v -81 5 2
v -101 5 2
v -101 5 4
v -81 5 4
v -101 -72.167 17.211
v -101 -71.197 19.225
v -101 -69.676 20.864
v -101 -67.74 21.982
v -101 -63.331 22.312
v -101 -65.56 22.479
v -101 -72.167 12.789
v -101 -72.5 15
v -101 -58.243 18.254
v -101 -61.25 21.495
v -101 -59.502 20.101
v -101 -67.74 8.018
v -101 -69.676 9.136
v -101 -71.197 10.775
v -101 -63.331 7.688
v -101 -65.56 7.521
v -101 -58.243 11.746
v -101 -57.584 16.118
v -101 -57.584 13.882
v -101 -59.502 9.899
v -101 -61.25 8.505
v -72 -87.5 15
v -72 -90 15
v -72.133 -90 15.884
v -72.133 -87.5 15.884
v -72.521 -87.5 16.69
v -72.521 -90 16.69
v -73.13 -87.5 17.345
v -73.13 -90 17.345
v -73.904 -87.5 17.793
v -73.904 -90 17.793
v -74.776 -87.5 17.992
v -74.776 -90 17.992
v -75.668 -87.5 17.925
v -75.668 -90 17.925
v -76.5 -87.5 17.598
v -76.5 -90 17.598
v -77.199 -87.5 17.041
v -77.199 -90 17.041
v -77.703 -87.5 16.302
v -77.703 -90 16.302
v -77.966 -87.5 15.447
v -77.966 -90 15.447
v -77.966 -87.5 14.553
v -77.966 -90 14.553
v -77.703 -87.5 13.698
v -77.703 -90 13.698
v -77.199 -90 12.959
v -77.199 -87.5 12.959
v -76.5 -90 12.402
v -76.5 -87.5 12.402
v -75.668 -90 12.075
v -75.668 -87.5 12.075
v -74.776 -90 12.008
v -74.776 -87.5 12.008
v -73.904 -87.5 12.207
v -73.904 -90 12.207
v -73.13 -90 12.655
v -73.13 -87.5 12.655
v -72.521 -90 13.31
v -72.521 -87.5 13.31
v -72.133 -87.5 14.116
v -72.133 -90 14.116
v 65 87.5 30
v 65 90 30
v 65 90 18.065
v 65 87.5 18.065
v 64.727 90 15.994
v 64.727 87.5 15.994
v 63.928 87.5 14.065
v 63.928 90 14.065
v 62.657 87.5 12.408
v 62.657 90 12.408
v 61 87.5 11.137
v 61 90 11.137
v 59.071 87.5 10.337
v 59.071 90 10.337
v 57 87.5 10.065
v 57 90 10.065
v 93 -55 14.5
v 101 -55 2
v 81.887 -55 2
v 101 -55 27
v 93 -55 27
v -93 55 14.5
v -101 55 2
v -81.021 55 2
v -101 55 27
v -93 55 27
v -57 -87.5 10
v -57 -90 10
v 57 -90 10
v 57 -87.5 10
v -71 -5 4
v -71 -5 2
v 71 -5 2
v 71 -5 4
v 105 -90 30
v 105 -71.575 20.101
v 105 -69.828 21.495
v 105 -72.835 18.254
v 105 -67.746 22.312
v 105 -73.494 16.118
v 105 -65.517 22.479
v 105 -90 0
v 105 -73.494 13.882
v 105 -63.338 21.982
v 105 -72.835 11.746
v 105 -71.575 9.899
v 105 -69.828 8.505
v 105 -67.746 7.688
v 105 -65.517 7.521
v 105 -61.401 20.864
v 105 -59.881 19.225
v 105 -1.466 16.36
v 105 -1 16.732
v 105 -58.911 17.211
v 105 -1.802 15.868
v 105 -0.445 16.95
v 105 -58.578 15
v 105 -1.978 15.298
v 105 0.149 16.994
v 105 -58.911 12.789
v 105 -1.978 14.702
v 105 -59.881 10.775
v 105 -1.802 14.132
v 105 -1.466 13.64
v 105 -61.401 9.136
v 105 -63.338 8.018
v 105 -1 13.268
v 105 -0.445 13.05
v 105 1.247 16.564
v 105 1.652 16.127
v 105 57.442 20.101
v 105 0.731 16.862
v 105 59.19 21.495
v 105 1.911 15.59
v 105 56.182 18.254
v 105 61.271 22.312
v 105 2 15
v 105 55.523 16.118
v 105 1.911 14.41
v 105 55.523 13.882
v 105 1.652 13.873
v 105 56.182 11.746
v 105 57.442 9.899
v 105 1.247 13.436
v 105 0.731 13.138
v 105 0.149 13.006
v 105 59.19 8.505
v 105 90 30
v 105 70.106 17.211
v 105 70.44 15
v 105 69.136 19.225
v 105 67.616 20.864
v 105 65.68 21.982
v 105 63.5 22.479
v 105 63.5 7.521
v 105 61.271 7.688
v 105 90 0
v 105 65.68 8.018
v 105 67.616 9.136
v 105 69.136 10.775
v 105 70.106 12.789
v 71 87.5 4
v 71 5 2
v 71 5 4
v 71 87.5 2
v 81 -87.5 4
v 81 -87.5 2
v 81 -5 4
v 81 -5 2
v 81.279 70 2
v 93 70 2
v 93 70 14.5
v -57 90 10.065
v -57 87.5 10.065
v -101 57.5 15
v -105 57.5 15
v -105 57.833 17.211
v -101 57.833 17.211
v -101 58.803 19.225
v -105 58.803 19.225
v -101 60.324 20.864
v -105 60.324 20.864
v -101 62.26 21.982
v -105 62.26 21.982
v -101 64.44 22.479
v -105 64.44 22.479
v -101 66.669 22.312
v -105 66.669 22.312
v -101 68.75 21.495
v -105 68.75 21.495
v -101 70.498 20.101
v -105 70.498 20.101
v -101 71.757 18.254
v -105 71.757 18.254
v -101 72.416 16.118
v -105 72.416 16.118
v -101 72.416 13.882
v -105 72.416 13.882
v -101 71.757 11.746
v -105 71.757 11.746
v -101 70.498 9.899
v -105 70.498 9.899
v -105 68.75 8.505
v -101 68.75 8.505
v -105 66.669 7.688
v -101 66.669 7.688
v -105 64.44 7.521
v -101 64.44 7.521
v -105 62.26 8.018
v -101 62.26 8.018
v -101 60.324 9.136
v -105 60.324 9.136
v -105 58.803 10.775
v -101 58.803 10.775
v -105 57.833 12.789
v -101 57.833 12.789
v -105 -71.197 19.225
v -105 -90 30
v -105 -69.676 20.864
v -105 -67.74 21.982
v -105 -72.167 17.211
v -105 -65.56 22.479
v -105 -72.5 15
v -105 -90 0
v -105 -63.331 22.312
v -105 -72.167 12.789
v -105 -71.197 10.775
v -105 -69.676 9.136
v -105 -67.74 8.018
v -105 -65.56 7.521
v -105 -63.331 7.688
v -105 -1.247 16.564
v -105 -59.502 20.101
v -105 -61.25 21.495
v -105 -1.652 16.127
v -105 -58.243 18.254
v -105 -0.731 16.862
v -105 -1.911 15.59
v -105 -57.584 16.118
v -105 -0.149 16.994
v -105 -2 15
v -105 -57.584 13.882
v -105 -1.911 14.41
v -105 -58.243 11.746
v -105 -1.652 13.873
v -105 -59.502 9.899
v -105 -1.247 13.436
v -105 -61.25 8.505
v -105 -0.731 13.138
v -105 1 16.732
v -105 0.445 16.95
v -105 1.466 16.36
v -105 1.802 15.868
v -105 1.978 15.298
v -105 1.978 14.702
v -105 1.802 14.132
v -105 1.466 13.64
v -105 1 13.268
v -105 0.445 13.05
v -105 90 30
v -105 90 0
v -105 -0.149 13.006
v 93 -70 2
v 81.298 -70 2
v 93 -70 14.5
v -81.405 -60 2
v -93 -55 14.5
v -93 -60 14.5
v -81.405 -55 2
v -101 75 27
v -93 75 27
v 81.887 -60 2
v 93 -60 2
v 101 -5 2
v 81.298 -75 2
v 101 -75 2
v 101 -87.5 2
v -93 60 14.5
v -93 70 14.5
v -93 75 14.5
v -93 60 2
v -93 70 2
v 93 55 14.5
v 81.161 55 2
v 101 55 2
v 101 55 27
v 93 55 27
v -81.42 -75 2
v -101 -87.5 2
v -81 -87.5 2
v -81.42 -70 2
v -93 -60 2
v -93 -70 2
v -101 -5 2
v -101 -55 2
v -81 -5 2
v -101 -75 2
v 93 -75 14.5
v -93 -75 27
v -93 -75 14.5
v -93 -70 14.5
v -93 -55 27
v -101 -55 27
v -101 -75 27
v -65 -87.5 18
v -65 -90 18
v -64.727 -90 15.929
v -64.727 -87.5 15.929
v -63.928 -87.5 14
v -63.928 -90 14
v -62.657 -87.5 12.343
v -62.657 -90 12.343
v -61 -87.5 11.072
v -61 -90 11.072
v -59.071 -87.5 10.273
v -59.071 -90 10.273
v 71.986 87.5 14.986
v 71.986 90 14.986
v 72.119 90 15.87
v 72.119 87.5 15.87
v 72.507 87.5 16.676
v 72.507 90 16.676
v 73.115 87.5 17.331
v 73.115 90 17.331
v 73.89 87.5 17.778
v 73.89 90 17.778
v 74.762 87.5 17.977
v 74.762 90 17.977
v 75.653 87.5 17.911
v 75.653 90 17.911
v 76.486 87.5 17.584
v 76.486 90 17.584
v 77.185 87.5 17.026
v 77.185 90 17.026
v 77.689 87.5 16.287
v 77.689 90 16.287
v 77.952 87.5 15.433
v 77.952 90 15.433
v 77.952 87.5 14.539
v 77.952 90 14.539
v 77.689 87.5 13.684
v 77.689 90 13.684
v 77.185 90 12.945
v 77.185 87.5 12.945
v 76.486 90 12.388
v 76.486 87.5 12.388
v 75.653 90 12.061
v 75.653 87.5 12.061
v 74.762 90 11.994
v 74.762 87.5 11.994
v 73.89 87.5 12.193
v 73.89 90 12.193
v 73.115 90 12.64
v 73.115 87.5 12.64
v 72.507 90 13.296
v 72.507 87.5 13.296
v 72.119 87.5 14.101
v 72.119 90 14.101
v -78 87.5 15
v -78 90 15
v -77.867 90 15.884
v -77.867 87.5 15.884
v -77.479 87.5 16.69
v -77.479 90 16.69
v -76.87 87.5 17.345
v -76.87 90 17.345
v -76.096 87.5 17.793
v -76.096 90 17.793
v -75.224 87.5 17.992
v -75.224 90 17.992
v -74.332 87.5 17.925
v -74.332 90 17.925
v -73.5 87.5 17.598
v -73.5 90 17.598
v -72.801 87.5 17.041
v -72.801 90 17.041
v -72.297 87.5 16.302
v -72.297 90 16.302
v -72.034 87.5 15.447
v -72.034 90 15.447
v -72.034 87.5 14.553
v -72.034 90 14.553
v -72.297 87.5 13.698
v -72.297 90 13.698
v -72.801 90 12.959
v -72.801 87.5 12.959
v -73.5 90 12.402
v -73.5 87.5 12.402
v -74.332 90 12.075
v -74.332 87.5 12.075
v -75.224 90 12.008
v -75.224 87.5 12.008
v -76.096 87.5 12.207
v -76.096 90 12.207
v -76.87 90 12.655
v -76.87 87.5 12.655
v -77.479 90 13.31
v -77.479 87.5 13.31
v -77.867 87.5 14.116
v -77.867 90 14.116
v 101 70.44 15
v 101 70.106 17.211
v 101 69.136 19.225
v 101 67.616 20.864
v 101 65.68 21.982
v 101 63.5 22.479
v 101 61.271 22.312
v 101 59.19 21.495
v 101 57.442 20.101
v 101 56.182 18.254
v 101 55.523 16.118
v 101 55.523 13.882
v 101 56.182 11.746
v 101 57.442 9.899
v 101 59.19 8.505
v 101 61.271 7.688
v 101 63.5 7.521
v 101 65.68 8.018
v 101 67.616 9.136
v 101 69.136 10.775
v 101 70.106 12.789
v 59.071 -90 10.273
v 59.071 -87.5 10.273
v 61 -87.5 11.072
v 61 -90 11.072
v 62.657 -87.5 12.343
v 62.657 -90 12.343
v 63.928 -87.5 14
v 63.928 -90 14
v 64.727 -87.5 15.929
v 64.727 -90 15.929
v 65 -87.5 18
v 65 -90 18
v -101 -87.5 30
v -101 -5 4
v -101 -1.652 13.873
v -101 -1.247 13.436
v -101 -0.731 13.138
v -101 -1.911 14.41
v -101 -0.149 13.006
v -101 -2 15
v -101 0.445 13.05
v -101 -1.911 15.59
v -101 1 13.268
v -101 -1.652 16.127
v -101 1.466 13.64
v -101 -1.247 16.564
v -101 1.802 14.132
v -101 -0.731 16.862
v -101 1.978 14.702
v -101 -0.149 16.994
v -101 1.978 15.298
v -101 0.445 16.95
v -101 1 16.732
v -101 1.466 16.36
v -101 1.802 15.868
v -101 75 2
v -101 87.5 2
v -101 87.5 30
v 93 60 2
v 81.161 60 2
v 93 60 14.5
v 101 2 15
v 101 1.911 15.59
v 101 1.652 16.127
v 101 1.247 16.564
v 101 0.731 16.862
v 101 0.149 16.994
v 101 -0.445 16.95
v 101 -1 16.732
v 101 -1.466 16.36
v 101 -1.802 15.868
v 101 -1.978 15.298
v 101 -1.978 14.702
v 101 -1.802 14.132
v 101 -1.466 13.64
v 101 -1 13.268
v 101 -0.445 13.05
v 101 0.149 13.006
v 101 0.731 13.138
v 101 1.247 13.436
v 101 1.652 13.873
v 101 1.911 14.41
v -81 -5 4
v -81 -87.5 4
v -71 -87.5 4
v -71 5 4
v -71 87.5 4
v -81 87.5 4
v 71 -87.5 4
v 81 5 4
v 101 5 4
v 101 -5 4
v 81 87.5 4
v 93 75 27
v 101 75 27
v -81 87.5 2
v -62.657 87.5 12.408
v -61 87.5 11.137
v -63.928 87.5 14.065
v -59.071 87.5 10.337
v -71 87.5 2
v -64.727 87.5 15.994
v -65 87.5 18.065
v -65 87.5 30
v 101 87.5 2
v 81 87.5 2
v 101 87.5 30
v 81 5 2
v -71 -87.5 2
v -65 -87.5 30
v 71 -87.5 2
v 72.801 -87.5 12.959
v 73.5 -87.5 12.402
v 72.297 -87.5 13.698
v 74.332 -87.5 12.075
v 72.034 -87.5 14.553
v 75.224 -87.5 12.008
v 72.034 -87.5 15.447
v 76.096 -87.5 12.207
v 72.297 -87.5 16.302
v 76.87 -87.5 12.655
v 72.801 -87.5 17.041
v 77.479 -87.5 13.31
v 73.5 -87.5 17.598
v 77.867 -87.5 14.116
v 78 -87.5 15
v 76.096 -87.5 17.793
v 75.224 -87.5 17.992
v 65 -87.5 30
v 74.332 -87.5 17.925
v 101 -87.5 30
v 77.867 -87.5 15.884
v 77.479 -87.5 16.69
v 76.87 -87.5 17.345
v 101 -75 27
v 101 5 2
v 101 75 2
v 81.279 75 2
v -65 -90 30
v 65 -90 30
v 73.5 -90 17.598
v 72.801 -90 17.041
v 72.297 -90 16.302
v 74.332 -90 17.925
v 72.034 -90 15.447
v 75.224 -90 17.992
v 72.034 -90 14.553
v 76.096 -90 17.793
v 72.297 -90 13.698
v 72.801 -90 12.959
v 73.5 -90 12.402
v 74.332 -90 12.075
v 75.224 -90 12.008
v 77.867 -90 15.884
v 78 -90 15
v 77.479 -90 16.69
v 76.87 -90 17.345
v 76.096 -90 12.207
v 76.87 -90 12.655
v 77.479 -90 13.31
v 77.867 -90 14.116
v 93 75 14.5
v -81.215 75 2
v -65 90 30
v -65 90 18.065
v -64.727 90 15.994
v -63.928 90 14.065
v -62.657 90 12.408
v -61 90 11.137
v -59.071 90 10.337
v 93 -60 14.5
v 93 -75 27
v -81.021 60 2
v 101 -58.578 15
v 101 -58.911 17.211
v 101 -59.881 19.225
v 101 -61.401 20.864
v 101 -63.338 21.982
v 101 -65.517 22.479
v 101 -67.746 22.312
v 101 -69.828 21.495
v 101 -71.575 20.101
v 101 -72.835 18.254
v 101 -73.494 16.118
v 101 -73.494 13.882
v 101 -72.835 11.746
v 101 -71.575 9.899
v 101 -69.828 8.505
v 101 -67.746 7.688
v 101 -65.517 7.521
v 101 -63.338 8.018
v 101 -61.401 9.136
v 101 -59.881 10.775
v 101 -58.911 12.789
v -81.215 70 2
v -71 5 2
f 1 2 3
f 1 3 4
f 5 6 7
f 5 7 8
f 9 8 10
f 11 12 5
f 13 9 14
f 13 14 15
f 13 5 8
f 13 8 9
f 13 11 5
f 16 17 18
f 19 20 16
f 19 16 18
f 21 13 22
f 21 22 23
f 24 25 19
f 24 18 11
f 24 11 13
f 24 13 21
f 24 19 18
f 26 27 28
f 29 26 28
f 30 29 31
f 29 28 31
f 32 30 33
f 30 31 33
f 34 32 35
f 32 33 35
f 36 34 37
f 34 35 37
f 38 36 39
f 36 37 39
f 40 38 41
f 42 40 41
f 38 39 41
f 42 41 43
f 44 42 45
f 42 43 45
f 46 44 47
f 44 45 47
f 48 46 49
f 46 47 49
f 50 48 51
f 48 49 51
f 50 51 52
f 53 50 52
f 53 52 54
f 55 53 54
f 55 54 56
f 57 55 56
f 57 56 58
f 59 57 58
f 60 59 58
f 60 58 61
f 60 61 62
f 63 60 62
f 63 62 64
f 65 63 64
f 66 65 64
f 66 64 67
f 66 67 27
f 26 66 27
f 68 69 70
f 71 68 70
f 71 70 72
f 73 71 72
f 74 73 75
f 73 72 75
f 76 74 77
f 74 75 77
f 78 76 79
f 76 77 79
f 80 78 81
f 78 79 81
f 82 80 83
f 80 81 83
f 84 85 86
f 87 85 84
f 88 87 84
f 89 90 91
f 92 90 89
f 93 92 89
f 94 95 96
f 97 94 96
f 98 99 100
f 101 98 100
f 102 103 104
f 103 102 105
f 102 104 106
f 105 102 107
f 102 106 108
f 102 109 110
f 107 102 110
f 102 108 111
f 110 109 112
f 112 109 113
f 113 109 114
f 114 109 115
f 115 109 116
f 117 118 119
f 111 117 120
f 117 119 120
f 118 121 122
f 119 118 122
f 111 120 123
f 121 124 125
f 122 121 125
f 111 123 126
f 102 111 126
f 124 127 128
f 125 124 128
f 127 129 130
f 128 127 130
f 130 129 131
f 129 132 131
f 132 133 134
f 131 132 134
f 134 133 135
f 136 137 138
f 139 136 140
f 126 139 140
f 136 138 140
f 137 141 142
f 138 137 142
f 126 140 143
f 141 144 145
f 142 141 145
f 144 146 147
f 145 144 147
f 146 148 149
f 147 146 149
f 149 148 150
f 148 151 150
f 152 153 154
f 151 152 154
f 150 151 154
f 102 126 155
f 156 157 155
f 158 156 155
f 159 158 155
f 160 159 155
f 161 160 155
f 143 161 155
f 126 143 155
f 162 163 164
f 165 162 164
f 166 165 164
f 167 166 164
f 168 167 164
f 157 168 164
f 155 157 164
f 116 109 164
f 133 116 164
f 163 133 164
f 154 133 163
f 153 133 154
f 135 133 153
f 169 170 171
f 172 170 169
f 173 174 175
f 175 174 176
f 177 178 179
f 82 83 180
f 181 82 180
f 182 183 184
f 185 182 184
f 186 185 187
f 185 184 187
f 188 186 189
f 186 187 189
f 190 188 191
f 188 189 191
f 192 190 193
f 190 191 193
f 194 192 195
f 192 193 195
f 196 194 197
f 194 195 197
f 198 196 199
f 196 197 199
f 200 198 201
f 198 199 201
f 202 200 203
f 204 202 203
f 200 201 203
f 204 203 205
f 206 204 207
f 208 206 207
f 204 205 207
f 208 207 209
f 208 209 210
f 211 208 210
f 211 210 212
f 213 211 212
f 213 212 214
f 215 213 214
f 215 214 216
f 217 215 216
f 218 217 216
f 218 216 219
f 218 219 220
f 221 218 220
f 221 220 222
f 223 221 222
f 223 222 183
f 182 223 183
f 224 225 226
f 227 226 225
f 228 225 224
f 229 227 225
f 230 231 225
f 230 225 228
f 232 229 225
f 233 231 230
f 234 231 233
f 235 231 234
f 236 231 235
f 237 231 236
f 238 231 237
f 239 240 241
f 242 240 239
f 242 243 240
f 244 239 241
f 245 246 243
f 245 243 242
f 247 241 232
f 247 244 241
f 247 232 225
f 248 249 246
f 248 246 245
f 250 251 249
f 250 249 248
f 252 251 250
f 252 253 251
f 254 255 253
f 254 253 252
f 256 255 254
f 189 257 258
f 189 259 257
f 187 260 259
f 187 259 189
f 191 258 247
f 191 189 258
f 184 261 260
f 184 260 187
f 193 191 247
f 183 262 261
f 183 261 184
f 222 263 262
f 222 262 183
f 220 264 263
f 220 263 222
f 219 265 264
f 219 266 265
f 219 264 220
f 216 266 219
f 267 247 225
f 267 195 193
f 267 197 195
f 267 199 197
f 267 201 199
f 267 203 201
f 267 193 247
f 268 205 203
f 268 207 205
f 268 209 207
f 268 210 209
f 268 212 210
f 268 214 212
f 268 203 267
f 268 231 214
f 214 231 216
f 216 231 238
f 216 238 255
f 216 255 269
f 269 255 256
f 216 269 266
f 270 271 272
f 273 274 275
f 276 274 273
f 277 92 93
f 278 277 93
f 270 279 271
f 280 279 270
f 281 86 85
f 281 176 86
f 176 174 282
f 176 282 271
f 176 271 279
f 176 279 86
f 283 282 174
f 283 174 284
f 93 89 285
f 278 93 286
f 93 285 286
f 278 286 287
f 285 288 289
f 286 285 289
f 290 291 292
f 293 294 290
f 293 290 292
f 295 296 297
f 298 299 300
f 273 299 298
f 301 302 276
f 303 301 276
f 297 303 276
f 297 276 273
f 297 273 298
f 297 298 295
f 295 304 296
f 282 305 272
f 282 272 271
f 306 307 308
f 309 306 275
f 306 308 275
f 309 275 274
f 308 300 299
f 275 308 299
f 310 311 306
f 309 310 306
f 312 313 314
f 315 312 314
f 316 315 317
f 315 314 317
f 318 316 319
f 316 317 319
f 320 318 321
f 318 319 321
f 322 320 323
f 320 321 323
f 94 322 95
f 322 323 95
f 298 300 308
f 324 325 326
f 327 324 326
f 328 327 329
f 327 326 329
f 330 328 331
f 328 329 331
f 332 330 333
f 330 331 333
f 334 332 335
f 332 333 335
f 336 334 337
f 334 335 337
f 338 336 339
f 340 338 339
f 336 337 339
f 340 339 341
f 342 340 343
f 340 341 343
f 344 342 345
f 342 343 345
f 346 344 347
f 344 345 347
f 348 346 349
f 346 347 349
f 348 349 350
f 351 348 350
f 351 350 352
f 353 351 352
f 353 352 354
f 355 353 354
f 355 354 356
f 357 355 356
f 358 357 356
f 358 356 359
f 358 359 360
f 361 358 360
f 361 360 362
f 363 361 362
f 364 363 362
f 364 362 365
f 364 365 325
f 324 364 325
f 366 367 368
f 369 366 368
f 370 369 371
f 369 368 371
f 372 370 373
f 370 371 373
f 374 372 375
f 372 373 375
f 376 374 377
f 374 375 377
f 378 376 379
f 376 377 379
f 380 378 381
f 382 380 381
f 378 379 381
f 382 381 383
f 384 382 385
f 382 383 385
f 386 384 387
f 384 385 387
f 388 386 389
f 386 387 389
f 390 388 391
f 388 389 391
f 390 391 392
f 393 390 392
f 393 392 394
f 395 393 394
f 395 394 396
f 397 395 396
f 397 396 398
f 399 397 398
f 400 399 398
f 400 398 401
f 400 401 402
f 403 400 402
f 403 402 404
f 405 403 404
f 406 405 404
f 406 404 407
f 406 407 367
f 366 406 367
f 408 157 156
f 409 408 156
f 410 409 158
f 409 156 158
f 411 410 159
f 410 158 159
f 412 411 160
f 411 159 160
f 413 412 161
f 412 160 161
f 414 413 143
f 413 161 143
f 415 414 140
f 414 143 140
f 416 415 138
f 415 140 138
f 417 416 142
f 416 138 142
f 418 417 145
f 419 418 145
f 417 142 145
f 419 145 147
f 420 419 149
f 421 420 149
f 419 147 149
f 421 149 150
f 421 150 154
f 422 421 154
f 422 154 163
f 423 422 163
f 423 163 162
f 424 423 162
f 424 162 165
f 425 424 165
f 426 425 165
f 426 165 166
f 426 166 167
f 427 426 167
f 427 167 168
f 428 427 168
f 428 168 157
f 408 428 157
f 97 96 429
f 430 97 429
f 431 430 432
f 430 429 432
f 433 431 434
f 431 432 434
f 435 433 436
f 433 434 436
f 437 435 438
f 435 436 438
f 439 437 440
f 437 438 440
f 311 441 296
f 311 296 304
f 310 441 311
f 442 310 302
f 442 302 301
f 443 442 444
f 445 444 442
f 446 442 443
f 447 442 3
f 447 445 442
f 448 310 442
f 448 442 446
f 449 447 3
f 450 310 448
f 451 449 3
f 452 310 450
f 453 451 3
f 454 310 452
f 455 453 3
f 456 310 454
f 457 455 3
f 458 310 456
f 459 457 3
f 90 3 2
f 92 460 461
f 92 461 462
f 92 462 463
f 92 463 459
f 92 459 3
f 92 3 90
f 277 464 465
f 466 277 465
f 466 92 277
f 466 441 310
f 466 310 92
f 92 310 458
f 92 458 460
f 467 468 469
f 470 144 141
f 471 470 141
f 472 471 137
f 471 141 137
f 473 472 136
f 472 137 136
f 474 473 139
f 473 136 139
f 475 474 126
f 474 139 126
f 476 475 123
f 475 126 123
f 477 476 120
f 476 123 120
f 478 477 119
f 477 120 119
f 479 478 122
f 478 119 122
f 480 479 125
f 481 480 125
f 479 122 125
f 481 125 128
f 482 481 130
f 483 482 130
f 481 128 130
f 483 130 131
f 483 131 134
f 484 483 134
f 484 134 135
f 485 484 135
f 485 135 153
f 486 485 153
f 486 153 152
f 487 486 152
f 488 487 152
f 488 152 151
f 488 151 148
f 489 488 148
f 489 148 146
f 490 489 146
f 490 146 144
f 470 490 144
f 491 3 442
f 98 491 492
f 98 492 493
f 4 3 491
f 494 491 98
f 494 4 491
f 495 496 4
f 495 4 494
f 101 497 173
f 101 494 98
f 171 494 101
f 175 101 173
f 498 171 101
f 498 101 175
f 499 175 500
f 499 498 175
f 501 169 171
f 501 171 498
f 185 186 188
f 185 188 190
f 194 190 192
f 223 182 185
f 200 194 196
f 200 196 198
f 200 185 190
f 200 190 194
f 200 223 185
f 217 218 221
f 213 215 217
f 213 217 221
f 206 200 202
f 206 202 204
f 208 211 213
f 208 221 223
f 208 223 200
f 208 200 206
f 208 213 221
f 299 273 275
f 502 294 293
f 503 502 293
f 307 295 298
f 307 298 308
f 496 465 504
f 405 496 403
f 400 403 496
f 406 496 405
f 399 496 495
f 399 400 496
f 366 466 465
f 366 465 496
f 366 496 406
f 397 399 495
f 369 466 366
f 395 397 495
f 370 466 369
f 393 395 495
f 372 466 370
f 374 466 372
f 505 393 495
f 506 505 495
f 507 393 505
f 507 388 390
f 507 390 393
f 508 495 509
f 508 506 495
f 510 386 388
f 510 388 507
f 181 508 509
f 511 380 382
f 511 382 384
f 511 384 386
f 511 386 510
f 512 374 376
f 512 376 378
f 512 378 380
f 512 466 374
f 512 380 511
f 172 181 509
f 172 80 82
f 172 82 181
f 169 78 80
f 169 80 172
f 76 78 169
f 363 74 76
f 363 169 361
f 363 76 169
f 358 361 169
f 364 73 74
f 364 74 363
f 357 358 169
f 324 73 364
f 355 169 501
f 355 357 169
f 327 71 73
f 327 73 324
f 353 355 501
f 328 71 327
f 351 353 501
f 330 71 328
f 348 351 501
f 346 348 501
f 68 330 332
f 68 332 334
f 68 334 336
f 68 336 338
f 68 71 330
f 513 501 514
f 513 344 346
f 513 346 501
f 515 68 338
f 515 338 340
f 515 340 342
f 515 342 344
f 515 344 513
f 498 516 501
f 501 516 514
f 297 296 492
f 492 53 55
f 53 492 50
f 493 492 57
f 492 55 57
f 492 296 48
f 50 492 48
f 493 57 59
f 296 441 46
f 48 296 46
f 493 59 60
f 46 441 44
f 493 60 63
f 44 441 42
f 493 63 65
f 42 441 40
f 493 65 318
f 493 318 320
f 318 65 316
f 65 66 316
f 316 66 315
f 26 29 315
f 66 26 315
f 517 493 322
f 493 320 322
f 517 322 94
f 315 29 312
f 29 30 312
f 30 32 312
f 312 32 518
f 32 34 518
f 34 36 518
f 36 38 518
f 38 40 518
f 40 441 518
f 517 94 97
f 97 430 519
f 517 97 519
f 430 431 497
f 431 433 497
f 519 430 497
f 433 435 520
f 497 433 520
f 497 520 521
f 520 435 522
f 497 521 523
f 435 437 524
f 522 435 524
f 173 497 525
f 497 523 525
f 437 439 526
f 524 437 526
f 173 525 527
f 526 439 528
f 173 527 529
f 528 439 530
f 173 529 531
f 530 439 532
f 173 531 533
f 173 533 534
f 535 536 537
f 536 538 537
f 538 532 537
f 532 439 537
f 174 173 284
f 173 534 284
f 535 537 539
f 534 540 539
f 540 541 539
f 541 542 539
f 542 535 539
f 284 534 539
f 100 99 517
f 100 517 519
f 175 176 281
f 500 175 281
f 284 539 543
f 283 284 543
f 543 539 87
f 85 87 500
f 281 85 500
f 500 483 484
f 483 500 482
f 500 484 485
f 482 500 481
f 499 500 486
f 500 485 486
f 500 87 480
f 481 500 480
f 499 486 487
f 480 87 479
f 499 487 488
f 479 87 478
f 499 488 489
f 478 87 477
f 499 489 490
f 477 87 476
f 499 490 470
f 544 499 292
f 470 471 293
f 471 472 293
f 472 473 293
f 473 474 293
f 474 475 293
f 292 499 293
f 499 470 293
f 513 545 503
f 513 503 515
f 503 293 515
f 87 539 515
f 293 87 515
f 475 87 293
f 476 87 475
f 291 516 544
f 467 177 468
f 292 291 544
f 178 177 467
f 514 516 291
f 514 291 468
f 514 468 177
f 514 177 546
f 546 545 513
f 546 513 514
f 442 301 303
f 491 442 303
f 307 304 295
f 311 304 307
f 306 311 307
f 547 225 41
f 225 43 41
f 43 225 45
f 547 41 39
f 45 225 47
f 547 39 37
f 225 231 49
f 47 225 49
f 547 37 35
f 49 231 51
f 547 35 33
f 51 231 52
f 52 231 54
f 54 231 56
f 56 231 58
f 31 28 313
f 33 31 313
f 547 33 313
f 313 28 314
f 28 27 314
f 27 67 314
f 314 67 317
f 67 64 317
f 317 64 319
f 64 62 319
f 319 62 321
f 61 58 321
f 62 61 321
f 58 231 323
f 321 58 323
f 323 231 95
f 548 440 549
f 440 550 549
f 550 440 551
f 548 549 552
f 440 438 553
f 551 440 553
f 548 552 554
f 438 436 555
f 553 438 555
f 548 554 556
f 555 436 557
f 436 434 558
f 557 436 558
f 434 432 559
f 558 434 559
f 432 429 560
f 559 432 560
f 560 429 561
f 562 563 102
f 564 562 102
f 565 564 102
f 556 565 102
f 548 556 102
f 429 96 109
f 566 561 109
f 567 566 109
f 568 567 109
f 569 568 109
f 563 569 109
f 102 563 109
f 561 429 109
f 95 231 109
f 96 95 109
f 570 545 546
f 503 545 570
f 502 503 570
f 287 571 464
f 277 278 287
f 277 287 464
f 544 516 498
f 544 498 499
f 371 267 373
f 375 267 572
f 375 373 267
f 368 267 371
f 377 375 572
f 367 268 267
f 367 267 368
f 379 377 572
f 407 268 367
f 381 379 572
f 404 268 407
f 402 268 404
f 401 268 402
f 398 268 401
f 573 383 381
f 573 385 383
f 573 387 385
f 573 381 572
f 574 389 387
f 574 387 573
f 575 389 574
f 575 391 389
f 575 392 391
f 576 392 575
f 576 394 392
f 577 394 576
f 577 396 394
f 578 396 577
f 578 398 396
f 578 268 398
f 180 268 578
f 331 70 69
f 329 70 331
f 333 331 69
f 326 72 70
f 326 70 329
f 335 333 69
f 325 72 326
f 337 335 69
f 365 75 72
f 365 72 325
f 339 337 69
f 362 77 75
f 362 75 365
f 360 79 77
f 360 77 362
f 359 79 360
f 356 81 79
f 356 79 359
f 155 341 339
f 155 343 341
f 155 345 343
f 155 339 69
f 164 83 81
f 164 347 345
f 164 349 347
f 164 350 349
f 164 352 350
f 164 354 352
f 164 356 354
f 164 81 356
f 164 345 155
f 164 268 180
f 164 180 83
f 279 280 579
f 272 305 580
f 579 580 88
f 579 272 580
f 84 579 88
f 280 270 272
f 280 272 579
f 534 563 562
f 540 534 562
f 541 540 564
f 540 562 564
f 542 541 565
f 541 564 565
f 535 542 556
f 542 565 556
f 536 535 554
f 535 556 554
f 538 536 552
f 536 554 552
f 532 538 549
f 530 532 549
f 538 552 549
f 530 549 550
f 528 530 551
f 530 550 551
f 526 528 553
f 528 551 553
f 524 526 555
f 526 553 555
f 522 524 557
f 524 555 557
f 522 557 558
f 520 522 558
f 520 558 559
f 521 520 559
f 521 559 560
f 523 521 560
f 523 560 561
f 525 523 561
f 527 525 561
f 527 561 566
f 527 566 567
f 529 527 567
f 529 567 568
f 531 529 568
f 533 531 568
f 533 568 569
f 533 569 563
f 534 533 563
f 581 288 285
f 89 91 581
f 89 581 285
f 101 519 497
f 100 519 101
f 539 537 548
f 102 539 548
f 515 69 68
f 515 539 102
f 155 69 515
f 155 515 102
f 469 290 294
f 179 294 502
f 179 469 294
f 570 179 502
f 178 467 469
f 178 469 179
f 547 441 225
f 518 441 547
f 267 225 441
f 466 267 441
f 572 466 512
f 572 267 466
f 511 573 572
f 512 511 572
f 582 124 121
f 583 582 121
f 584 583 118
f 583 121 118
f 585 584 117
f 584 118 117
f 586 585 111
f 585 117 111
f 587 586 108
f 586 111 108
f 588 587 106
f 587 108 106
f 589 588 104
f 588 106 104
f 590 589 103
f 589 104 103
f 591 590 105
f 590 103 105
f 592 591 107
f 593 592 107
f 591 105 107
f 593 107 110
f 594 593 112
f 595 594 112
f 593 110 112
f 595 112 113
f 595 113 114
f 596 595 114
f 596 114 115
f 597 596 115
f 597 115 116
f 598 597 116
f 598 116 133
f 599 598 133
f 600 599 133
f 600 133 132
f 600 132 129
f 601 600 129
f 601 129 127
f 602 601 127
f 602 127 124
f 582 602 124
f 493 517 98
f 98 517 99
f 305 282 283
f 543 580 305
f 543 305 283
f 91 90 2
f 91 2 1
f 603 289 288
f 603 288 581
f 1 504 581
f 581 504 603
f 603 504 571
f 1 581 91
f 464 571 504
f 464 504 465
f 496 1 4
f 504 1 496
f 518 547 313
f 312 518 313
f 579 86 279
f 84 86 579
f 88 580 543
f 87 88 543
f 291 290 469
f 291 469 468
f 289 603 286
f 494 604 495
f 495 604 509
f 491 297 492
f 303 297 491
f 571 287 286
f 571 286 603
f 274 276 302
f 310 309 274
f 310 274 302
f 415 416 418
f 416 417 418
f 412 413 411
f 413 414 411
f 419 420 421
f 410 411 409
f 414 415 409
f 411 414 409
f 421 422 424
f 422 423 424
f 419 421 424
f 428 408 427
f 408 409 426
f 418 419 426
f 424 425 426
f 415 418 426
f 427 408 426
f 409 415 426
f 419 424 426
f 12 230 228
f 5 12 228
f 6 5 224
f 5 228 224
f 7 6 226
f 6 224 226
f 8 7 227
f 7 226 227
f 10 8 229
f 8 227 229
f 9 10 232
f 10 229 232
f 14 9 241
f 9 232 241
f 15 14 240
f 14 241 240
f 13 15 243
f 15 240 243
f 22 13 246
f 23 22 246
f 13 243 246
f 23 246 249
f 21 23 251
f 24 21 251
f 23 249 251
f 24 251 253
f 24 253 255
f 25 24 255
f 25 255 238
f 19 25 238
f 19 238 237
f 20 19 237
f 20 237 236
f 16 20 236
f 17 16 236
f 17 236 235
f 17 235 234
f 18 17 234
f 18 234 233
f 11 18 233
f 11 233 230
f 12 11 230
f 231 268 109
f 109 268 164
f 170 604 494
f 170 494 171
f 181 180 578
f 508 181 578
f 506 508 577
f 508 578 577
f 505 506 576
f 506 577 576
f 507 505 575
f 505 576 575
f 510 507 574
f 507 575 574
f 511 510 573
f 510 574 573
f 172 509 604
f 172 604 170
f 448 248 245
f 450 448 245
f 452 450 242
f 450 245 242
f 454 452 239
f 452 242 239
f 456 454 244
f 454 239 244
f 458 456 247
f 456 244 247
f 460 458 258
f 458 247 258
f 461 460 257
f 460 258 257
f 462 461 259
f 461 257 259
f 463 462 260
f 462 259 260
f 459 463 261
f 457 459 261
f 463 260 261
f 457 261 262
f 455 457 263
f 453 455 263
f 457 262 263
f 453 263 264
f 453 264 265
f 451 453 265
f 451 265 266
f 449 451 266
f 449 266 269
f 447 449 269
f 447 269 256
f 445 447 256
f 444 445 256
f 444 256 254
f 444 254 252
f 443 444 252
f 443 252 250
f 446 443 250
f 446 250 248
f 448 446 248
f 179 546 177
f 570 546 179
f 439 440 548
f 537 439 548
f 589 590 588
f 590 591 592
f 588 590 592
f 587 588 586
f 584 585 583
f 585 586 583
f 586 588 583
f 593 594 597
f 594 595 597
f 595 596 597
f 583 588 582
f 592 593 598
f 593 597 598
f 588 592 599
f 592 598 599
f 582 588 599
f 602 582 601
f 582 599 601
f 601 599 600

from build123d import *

# Parameters (mm, degrees)
F0_W      = 210
F0_H      = 180
F1_DEPTH  = 30
F2_W      = 202
F2_H      = 175
F3_DEPTH  = 28
F4_R      = 3
F5_DEPTH  = 4
F6_W      = 10
F6_H      = 82.5
F6_W_2    = 20
F6_H_2    = 10
F6_W_3    = 142
F7_DEPTH  = 2
F8_R      = 2
F9_DEPTH  = 5
F10_R     = 2
F10_R_2   = 7.5
F11_DEPTH = 5
F12_R     = 7.5
F13_DEPTH = 5
F14_W     = 8
F14_H     = 20
F15_DEPTH = 25
F17_DEPTH = 5
F19_DEPTH = 5
F21_DEPTH = 5
F23_DEPTH = 5
F25_DEPTH = 5
F27_DEPTH = 5
F30_DEPTH = 5
F32_DEPTH = 5
F33_R     = 3
F34_DEPTH = 4


# Not quite as in the source:
# - a feature names something its author has since deleted; it is built from what else it names


with BuildPart() as f1:
    # F0 (on Top) → F1 (new body)
    with BuildSketch(Plane.XY):
        Rectangle(F0_W, F0_H)
    extrude(amount=F1_DEPTH)

    # F2 (on face) → F3 (cut)
    with BuildSketch(Plane.XY.offset(30)):
        Rectangle(F2_W, F2_H)
    extrude(amount=-F3_DEPTH, mode=Mode.SUBTRACT)

    # F4 (on face) → F5 (cut)
    with BuildSketch(Plane.XZ.offset(90)):
        with BuildLine():
            Line((-57, 10), (-15, 10))
            Line((-15, 10), (15, 10))
            Line((15, 10), (57, 10))
            ThreePointArc((57, 10), (62.6568542495, 12.3431457505), (65, 18))
            Line((65, 18), (65, 30))
            Line((65, 30), (-65, 30))
            Line((-65, 30), (-65, 18))
            ThreePointArc((-65, 18), (-62.6568542495, 12.3431457505), (-57, 10))
        make_face()
        with Locations((-75, 15)):
            Circle(F4_R)
        with Locations((75, 15)):
            Circle(F4_R)
    extrude(amount=-F5_DEPTH, mode=Mode.SUBTRACT)

    # F8 (on face) → F9 (cut)
    with BuildSketch(Plane.YZ.offset(105)):
        with Locations((0, 15)):
            Circle(F8_R)
    extrude(amount=-F9_DEPTH, mode=Mode.SUBTRACT)

    # F10 (on face) → F11 (cut)
    with BuildSketch(Plane(origin=(-105, 0, 0), x_dir=(0, -1, 0), z_dir=(-1, 0, 0))):
        with Locations((0, 15)):
            Circle(F10_R)
        with Locations((-65, 15)):
            Circle(F10_R_2)
        with Locations((65, 15)):
            Circle(F10_R_2)
    extrude(amount=-F11_DEPTH, mode=Mode.SUBTRACT)

    # F12 (on face) → F13 (cut)
    with BuildSketch(Plane.YZ.offset(105)):
        with Locations((-66.0775899887, 15)):
            Circle(F12_R)
        with Locations((62.939658761, 15)):
            Circle(F12_R)
    extrude(amount=-F13_DEPTH, mode=Mode.SUBTRACT)

    # F14 (on face) → F15 (join)
    with BuildSketch(Plane.XY.offset(2)):
        with Locations((-97, 65)):
            Rectangle(F14_W, F14_H)
        with Locations((-97, -65)):
            Rectangle(F14_W, F14_H)
        with Locations((97, 65)):
            Rectangle(F14_W, F14_H)
        with Locations((97, -65)):
            Rectangle(F14_W, F14_H)
    extrude(amount=F15_DEPTH)

    # F16 (on face) → F17 (join)
    with BuildSketch(Plane(origin=(0, -55, 0), x_dir=(-1, 0, 0), z_dir=(0, 1, 0))):
        Polygon((-93, 2), (-81.6266089678, 1.707098214), (-93, 14.5), align=None)
    extrude(amount=-F17_DEPTH)

    # F18 (on face) → F19 (join)
    with BuildSketch(Plane.XZ.offset(-55)):
        Polygon((-93, 14.5), (-93, 2), (-81.0206457973, 2), align=None)
    extrude(amount=-F19_DEPTH)

    # F20 (on face) → F21 (join)
    with BuildSketch(Plane.XZ.offset(-55)):
        Polygon((81.1605315804, 2), (93, 2), (93, 14.5), align=None)
    extrude(amount=-F21_DEPTH)

    # F22 (on face) → F23 (join)
    with BuildSketch(Plane(origin=(0, -55, 0), x_dir=(-1, 0, 0), z_dir=(0, 1, 0))):
        Polygon((81.4045146108, 2), (93, 2), (93, 14.5), align=None)
    extrude(amount=-F23_DEPTH)

    # F24 (on face) → F25 (join)
    with BuildSketch(Plane(origin=(0, 75, 0), x_dir=(-1, 0, 0), z_dir=(0, 1, 0))):
        Polygon((81.214748323, 2), (93, 2), (93, 14.5), align=None)
    extrude(amount=-F25_DEPTH)

    # F26 (on face) → F27 (join)
    with BuildSketch(Plane.XZ.offset(75)):
        Polygon((81.2978520989, 2), (93, 2), (93, 14.5), align=None)
    extrude(amount=-F27_DEPTH)


with BuildPart() as f7:
    # F6 (on face) → F7 (new body)
    with BuildSketch(Plane.XY.offset(2)):
        with Locations((-76, 46.25)):
            Rectangle(F6_W, F6_H)
        with Locations((76, 46.25)):
            Rectangle(F6_W, F6_H)
        with Locations((-91, 0)):
            Rectangle(F6_W_2, F6_H_2)
        with Locations((-76, 0)):
            Rectangle(F6_W, F6_H_2)
        with Locations((-76, -46.25)):
            Rectangle(F6_W, F6_H)
        Rectangle(F6_W_3, F6_H_2)
        with Locations((76, 0)):
            Rectangle(F6_W, F6_H_2)
        with Locations((76, -46.25)):
            Rectangle(F6_W, F6_H)
        with Locations((91, 0)):
            Rectangle(F6_W_2, F6_H_2)
    extrude(amount=F7_DEPTH)


with BuildPart() as f1_1:
    add(f1.part)

    # F28: union F7
    add(f7.part)

    # F29 (on face) → F30 (join)
    with BuildSketch(Plane.XZ.offset(75)):
        Polygon((-93, 14.5), (-93, 2), (-81.4201831818, 2), align=None)
    extrude(amount=-F30_DEPTH)

    # F31 (on face) → F32 (join)
    with BuildSketch(Plane(origin=(0, 75, 0), x_dir=(-1, 0, 0), z_dir=(0, 1, 0))):
        Polygon((-93, 14.5), (-93, 2), (-81.2787339091, 2), align=None)
    extrude(amount=-F32_DEPTH)

    # F33 (on face) → F34 (cut)
    with BuildSketch(Plane(origin=(0, 90, 0), x_dir=(-1, 0, 0), z_dir=(0, 1, 0))):
        with BuildLine():
            Line((-57, 10.0647527289), (-15, 10.0647527289))
            Line((-15, 10.0647527289), (15, 10.0647527289))
            Line((15, 10.0647527289), (57, 10.0647527289))
            ThreePointArc((57, 10.0647527289), (62.6568542495, 12.4078984794), (65, 18.0647527289))
            Line((65, 18.0647527289), (65, 30))
            Line((65, 30), (-65, 30))
            Line((-65, 30), (-65, 18.0647527289))
            ThreePointArc((-65, 18.0647527289), (-62.6568542495, 12.4078984794), (-57, 10.0647527289))
        make_face()
        with Locations((-74.9857133275, 14.9857269089)):
            Circle(F33_R)
        with Locations((75, 15)):
            Circle(F33_R)
    extrude(amount=-F34_DEPTH, mode=Mode.SUBTRACT)


solid = f1_1.part
